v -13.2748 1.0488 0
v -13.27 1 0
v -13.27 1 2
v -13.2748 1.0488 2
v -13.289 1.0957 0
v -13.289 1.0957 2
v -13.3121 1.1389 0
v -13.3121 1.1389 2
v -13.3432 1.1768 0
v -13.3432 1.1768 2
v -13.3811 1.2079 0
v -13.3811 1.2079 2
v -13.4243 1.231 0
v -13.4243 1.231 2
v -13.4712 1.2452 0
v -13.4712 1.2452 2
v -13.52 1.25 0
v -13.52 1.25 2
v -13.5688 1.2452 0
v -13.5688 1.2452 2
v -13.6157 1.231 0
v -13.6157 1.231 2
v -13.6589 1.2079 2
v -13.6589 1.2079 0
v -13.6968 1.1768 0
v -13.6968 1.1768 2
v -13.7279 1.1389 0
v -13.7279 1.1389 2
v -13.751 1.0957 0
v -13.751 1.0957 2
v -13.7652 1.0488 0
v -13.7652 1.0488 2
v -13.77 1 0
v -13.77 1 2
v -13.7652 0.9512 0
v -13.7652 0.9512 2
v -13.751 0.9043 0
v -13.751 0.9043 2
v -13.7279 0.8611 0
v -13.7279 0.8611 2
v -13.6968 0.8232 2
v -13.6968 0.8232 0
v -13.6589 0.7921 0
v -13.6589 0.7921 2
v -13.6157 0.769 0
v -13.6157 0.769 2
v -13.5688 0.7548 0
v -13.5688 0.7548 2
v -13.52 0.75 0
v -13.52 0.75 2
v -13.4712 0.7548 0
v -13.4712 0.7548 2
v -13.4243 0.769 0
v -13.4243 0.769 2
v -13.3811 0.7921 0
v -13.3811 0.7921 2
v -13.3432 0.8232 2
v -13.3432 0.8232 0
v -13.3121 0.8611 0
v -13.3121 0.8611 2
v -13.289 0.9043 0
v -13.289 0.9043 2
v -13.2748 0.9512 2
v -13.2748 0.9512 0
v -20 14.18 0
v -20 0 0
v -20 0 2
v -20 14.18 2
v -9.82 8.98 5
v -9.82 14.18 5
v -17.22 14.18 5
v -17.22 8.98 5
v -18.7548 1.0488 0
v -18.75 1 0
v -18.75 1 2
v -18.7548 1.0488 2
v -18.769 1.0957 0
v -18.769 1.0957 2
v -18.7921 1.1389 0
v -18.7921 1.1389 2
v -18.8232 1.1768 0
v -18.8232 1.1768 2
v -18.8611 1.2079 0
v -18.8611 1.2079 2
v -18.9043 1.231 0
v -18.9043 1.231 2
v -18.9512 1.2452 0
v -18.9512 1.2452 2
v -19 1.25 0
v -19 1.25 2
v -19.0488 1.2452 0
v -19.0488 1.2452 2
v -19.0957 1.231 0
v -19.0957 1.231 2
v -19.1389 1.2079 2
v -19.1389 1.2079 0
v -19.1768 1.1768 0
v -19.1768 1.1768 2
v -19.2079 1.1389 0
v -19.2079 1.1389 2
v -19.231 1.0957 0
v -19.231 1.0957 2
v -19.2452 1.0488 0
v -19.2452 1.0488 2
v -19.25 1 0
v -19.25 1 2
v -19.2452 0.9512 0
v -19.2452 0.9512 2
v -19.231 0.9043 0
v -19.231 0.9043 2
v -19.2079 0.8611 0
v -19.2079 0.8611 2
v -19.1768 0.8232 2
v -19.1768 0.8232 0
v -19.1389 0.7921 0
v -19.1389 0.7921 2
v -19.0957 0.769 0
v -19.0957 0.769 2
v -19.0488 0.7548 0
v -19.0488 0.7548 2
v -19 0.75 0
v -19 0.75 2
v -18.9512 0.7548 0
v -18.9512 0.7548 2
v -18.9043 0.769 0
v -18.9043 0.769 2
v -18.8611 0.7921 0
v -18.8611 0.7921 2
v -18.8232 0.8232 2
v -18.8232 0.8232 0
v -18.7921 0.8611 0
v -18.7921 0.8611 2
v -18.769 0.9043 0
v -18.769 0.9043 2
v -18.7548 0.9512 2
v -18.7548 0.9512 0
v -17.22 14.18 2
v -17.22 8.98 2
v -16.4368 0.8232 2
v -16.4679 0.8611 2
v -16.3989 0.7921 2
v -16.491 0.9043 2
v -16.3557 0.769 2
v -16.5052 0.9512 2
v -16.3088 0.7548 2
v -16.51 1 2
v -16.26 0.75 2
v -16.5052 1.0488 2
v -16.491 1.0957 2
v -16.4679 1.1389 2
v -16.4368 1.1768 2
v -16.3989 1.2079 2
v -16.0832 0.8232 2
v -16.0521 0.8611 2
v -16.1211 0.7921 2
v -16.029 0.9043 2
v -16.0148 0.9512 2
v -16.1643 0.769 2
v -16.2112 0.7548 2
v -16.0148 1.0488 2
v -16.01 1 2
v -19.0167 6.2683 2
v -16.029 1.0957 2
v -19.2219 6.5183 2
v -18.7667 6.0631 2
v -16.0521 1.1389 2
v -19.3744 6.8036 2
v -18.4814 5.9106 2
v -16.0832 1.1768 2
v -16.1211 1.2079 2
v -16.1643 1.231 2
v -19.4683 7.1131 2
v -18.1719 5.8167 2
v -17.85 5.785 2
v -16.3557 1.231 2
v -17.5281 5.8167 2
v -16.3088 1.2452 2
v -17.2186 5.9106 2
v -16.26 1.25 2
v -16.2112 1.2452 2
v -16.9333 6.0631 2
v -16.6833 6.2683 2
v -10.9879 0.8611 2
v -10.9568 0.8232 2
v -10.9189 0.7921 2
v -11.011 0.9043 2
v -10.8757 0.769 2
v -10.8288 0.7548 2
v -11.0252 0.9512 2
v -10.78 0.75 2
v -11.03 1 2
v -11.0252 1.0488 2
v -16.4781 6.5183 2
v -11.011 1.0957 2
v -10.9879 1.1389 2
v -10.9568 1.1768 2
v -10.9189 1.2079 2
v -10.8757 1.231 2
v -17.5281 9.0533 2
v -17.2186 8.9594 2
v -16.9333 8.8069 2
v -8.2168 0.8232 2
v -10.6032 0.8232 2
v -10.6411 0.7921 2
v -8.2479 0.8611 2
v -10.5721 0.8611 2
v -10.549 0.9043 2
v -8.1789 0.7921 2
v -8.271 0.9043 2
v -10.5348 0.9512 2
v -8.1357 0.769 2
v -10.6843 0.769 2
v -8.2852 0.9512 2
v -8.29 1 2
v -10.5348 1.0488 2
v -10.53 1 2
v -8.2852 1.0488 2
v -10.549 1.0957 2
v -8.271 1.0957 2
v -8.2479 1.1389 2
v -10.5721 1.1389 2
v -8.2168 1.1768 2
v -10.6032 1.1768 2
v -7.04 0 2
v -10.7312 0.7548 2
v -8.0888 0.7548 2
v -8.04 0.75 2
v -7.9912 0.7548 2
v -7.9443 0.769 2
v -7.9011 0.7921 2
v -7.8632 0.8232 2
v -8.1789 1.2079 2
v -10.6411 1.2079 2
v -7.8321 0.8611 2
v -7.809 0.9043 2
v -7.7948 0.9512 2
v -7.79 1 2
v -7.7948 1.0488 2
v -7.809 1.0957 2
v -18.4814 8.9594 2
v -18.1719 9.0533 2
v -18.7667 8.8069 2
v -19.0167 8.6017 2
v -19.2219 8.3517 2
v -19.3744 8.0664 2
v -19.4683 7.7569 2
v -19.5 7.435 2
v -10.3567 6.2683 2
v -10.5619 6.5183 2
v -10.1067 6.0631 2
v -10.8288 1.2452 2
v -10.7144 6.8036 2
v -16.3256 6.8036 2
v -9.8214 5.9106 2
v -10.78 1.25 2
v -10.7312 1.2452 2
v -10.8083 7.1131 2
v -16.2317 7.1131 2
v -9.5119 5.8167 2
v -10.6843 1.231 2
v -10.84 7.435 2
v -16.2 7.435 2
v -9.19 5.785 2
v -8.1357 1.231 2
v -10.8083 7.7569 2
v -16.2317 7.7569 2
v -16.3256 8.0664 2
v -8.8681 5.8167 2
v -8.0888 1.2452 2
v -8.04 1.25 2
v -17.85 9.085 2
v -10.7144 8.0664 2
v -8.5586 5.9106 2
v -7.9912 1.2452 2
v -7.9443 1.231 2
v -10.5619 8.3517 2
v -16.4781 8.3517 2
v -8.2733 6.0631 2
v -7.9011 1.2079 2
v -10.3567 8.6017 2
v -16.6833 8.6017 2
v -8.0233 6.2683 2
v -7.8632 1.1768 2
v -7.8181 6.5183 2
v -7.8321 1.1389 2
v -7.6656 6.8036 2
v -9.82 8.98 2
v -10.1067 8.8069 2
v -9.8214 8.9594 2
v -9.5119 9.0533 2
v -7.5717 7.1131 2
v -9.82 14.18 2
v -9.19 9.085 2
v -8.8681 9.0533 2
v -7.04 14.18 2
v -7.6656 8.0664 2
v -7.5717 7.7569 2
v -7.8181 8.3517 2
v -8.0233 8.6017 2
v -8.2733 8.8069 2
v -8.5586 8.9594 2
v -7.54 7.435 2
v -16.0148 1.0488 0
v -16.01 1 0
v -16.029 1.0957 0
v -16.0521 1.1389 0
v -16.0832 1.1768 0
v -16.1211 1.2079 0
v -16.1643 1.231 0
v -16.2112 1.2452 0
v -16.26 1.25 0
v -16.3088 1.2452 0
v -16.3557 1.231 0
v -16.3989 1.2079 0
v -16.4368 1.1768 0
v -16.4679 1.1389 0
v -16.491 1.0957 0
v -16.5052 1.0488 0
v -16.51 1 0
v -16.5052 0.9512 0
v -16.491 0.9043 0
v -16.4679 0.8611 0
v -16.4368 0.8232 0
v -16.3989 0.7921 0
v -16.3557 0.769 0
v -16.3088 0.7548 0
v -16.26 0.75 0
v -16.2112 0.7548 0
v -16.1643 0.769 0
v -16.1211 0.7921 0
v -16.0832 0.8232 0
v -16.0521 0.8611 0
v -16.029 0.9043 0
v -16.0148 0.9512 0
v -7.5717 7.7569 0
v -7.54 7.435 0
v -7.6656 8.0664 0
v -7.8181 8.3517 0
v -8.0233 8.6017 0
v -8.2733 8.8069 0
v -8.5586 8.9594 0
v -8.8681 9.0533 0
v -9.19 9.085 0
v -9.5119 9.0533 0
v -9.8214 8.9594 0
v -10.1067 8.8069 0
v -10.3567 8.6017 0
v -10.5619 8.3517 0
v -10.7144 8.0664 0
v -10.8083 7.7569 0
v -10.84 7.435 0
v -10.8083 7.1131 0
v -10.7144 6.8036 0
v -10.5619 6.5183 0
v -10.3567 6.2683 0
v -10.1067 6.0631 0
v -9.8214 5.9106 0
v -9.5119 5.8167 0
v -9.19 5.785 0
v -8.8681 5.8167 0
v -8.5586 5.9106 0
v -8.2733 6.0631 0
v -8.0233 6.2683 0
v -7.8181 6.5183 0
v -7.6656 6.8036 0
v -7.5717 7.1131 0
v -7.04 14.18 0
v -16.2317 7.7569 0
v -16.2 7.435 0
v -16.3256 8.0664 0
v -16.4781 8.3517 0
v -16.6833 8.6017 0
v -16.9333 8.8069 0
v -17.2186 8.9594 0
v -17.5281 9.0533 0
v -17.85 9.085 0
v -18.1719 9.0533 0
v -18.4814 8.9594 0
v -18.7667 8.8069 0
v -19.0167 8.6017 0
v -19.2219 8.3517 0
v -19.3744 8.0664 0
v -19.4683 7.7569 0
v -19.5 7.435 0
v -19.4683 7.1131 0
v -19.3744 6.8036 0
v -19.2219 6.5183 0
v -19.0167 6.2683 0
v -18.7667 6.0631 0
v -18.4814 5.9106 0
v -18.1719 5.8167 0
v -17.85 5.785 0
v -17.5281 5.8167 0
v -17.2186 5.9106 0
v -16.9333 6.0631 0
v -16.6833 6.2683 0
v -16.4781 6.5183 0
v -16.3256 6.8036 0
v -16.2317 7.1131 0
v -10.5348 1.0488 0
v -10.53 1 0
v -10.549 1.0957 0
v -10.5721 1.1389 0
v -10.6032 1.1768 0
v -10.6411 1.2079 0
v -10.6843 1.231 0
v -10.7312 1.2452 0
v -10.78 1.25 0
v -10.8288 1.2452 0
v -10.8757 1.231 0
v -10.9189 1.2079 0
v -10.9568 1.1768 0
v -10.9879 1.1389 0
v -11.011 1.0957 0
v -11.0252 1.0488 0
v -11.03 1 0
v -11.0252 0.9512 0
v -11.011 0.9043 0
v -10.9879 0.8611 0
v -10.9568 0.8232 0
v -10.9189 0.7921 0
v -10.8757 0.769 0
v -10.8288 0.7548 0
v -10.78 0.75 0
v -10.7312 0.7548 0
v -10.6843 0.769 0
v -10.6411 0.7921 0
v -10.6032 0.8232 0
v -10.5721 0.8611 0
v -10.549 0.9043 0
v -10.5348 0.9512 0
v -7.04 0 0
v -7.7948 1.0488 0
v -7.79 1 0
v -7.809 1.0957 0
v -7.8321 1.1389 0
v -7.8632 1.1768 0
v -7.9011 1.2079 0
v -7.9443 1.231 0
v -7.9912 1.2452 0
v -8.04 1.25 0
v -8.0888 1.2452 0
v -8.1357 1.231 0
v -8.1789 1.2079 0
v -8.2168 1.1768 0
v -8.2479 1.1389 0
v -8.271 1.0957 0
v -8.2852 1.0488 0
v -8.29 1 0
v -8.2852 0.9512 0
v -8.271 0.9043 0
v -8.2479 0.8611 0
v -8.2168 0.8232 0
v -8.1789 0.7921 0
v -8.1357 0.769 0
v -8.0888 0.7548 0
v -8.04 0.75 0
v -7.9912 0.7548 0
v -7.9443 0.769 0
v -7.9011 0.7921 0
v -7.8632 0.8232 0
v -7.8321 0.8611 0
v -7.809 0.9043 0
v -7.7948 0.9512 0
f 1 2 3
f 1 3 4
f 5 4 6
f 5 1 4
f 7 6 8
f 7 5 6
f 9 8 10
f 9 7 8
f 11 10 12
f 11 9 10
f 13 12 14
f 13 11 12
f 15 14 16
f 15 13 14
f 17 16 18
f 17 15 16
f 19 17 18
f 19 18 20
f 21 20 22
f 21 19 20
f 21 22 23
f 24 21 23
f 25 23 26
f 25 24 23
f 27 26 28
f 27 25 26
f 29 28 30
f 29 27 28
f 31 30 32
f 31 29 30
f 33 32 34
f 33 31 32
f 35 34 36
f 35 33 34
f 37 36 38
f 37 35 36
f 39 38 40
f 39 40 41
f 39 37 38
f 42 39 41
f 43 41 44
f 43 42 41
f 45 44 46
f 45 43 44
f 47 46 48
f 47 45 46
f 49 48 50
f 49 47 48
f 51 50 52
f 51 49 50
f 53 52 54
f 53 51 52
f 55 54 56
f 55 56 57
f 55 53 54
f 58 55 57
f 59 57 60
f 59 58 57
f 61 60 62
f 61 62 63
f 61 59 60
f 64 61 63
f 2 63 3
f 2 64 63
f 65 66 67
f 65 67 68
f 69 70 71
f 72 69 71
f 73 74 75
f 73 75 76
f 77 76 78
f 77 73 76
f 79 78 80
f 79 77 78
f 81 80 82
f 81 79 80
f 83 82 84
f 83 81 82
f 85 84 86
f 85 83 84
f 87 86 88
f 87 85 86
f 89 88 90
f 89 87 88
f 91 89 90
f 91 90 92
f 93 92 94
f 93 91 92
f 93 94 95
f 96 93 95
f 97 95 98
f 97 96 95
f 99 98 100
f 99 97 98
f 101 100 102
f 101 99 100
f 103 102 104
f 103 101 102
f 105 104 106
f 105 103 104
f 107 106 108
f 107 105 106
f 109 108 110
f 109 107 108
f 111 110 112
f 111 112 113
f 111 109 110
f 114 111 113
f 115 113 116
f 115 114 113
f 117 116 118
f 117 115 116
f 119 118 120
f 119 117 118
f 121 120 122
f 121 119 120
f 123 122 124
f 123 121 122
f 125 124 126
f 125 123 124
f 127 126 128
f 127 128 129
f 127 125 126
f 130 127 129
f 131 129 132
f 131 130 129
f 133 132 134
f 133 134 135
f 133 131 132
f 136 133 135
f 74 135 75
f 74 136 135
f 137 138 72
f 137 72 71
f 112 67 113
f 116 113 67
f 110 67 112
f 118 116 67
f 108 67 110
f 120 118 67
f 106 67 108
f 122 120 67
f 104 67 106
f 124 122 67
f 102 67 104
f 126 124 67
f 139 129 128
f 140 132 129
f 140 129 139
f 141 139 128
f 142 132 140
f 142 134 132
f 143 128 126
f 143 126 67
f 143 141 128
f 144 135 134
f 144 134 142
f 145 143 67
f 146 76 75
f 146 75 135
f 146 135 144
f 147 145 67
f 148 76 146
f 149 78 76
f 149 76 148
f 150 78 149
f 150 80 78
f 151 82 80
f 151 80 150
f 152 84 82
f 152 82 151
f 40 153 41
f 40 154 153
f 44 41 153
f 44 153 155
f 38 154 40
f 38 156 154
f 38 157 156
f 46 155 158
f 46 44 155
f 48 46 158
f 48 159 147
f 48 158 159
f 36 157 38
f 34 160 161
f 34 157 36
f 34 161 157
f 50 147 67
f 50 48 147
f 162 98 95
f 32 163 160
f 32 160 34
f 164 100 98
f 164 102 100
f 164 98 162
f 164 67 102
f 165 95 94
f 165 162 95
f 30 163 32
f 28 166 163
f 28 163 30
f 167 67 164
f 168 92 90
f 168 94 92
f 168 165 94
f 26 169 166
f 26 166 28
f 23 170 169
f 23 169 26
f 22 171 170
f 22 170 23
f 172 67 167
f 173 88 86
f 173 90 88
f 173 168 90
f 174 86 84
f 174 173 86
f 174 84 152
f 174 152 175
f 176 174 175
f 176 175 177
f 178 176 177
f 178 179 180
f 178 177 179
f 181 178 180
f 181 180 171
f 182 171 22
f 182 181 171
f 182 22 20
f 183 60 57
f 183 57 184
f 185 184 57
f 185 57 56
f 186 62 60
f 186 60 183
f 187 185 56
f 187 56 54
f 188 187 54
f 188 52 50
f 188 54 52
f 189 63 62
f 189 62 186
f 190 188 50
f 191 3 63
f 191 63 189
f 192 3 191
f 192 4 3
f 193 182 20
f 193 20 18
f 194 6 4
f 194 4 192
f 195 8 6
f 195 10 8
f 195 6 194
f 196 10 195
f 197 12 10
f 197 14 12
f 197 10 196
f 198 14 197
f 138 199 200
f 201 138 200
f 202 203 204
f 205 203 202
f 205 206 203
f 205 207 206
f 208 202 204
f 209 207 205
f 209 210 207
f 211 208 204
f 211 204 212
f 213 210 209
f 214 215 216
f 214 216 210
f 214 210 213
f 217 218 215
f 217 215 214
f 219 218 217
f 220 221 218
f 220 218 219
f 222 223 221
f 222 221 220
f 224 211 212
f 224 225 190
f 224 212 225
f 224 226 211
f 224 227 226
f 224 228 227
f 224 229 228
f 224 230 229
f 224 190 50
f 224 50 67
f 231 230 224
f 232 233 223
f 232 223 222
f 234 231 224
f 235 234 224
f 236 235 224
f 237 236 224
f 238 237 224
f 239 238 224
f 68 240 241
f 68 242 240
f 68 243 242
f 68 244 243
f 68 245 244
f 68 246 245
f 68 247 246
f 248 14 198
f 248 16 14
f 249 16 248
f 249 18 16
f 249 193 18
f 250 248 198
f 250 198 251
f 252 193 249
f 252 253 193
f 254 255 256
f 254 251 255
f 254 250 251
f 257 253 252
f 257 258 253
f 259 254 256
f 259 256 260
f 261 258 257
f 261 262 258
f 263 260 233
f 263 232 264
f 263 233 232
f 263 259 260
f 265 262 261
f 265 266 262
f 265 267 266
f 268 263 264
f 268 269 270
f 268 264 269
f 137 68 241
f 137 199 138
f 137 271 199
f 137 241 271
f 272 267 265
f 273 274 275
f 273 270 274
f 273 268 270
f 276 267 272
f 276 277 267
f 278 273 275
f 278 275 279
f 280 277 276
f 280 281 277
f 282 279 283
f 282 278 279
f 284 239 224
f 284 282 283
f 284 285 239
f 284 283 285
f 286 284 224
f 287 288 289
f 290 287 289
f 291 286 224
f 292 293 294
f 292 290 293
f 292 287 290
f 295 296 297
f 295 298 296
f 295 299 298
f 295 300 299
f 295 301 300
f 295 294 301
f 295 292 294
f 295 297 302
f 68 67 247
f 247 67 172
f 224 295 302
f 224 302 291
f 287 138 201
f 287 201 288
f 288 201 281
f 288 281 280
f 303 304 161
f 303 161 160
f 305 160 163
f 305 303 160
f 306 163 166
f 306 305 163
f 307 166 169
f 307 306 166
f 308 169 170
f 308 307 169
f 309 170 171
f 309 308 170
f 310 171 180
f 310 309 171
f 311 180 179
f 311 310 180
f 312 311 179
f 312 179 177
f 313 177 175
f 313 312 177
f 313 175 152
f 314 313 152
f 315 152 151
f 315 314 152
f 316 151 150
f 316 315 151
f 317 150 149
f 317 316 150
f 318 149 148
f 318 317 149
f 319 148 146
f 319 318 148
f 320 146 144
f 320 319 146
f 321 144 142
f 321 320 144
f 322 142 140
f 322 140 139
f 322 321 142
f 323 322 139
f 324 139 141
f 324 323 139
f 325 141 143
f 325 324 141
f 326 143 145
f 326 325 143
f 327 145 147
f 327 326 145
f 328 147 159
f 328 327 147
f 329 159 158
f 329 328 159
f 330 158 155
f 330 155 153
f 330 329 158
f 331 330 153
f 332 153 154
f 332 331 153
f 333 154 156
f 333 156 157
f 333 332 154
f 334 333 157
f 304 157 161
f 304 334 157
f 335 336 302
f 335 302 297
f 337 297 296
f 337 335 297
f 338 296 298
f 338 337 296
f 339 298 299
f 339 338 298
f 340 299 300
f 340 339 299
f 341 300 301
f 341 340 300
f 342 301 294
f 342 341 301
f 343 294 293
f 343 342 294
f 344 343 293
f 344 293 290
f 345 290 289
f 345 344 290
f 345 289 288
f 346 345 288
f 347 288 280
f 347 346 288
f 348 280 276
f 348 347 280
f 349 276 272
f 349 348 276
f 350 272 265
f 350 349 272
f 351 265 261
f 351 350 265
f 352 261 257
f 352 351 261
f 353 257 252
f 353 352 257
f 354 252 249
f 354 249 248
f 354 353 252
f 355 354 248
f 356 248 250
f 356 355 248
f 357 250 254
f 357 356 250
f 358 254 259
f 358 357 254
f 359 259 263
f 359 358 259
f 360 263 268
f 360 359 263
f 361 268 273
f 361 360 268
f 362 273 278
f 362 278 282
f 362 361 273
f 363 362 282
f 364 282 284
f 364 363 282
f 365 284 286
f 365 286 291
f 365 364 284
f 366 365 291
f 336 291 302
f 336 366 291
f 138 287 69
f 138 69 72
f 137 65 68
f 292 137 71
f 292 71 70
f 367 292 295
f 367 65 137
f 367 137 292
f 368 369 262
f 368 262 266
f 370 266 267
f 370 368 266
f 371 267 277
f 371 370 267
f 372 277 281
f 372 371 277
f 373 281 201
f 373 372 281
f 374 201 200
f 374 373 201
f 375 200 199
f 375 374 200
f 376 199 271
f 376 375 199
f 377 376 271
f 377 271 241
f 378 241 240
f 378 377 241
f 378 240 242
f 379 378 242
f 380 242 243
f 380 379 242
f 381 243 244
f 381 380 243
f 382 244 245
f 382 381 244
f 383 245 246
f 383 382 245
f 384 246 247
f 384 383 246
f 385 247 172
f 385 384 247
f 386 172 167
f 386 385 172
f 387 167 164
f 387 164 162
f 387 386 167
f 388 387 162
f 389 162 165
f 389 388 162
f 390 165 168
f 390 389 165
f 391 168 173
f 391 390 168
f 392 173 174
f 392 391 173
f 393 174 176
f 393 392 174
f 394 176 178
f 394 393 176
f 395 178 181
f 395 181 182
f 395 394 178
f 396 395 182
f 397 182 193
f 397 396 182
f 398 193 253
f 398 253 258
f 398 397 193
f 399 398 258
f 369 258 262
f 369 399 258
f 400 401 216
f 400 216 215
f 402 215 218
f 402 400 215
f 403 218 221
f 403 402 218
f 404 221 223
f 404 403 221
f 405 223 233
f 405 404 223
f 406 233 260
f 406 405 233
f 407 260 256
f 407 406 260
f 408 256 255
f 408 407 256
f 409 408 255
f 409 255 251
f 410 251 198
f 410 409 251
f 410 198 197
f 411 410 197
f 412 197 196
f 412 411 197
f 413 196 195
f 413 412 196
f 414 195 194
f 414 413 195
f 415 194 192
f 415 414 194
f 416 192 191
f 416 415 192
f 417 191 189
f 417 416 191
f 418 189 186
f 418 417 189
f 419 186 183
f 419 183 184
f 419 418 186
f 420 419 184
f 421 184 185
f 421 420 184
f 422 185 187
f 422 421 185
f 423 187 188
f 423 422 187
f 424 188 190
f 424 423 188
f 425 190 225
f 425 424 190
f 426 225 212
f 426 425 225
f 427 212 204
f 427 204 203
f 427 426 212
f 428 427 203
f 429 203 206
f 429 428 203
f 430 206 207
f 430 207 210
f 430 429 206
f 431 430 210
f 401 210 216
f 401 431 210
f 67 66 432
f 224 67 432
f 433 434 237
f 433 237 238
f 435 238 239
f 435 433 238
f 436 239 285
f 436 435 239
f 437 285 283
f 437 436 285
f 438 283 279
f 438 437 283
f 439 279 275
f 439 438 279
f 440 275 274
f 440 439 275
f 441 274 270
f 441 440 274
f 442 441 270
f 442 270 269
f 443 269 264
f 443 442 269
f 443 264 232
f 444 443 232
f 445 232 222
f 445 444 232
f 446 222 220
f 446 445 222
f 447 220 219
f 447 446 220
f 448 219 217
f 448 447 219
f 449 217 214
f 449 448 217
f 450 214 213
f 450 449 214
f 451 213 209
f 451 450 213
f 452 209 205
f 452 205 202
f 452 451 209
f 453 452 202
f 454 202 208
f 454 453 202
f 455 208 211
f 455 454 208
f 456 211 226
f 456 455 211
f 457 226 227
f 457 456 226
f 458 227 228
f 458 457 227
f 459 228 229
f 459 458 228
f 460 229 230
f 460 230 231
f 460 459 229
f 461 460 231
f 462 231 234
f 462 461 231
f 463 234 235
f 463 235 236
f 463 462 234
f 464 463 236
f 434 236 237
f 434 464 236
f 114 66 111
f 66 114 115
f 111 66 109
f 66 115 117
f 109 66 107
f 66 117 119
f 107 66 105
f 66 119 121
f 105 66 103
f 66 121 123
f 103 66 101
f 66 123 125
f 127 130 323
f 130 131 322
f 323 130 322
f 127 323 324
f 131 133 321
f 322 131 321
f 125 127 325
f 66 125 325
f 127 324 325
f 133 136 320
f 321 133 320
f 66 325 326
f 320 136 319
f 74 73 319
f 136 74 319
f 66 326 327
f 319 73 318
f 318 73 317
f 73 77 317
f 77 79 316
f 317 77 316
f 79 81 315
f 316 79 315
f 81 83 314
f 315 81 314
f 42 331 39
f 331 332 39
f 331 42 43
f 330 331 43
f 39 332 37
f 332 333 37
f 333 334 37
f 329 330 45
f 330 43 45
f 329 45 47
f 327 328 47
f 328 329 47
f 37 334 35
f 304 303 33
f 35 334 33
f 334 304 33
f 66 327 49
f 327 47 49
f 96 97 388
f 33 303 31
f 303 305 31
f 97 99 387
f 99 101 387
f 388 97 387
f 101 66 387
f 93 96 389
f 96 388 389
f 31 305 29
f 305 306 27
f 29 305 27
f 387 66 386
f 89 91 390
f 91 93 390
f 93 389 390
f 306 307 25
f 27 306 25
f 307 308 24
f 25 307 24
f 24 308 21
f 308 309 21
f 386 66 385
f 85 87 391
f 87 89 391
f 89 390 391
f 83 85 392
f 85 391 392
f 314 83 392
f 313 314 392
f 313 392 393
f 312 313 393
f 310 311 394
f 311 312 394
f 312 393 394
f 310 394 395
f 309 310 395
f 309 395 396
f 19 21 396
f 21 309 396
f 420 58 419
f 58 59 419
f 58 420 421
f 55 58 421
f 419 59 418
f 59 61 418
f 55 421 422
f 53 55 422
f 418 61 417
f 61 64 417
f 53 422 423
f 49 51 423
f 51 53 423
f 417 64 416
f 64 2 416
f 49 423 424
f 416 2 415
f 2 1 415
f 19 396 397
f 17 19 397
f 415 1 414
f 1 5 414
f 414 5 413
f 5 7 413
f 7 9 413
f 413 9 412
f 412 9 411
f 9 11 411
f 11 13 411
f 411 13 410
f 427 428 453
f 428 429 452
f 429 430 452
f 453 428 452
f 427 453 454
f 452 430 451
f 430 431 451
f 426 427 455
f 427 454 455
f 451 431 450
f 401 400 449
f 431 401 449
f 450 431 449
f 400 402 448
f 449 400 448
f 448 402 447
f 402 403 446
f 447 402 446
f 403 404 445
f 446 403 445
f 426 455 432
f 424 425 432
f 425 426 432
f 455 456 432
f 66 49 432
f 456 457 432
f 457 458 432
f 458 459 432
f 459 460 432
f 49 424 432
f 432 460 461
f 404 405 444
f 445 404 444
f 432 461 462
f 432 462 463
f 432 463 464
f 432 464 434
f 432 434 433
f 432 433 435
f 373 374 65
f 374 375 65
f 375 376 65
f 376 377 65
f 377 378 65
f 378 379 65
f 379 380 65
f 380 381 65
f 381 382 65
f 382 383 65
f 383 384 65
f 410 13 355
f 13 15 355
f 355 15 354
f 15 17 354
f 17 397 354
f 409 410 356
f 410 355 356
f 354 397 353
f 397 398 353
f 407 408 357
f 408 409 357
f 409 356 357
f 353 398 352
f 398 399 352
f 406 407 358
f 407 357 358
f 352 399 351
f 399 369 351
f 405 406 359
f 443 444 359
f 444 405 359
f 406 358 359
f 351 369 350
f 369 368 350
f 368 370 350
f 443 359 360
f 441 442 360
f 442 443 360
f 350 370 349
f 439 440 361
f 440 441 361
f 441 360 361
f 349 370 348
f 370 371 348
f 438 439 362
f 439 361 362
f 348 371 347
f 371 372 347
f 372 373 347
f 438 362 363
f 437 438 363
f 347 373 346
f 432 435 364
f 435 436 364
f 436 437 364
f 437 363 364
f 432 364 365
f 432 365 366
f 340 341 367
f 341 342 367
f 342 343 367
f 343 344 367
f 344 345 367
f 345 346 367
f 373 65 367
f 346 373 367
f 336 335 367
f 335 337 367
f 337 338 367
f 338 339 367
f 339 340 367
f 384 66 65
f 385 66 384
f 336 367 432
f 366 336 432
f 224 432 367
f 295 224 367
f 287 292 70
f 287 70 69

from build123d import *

# Parameters (mm, degrees)
EXTRUDE001_DEPTH = 3
SKETCH_W         = 12.96
SKETCH_H         = 14.18
SKETCH_R         = 0.25
SKETCH_R_2       = 1.65
EXTRUDE_DEPTH    = 2


with BuildPart() as extrude_microusbbreakout_parts:
    # Sketch001 → Extrude001 (new body)
    with BuildSketch(Plane.XY):
        Polygon((10.18, 14.18), (10.18, 8.98), (2.78, 8.98), (2.78, 14.18), (6.48, 14.18), align=None)
    extrude(amount=EXTRUDE001_DEPTH)


with BuildPart() as extrude_microusbbreakout_parts_1:
    # Extrude001 placement: moved
    add(extrude_microusbbreakout_parts.part.moved(Location((0, 0, 2))))


with BuildPart() as fusion_microusbbreakout:
    # Sketch → Extrude (new body)
    with BuildSketch(Plane.XY):
        with Locations((6.48, 7.09)):
            Rectangle(SKETCH_W, SKETCH_H)
        with Locations((1, 1)):
            Circle(SKETCH_R, mode=Mode.SUBTRACT)
        with Locations((3.74, 1)):
            Circle(SKETCH_R, mode=Mode.SUBTRACT)
        with Locations((6.48, 1)):
            Circle(SKETCH_R, mode=Mode.SUBTRACT)
        with Locations((9.22, 1)):
            Circle(SKETCH_R, mode=Mode.SUBTRACT)
        with Locations((11.96, 1)):
            Circle(SKETCH_R, mode=Mode.SUBTRACT)
        with Locations((2.15, 7.435)):
            Circle(SKETCH_R_2, mode=Mode.SUBTRACT)
        with Locations((10.81, 7.435)):
            Circle(SKETCH_R_2, mode=Mode.SUBTRACT)
    extrude(amount=EXTRUDE_DEPTH)

    # Fusion: union Extrude_MicroUSBBreakout_parts
    add(extrude_microusbbreakout_parts_1.part)


with BuildPart() as fusion_microusbbreakout_1:
    # Fusion placement: moved
    add(fusion_microusbbreakout.part.moved(Location((-20, 0, 0))))


solid = fusion_microusbbreakout_1.part
